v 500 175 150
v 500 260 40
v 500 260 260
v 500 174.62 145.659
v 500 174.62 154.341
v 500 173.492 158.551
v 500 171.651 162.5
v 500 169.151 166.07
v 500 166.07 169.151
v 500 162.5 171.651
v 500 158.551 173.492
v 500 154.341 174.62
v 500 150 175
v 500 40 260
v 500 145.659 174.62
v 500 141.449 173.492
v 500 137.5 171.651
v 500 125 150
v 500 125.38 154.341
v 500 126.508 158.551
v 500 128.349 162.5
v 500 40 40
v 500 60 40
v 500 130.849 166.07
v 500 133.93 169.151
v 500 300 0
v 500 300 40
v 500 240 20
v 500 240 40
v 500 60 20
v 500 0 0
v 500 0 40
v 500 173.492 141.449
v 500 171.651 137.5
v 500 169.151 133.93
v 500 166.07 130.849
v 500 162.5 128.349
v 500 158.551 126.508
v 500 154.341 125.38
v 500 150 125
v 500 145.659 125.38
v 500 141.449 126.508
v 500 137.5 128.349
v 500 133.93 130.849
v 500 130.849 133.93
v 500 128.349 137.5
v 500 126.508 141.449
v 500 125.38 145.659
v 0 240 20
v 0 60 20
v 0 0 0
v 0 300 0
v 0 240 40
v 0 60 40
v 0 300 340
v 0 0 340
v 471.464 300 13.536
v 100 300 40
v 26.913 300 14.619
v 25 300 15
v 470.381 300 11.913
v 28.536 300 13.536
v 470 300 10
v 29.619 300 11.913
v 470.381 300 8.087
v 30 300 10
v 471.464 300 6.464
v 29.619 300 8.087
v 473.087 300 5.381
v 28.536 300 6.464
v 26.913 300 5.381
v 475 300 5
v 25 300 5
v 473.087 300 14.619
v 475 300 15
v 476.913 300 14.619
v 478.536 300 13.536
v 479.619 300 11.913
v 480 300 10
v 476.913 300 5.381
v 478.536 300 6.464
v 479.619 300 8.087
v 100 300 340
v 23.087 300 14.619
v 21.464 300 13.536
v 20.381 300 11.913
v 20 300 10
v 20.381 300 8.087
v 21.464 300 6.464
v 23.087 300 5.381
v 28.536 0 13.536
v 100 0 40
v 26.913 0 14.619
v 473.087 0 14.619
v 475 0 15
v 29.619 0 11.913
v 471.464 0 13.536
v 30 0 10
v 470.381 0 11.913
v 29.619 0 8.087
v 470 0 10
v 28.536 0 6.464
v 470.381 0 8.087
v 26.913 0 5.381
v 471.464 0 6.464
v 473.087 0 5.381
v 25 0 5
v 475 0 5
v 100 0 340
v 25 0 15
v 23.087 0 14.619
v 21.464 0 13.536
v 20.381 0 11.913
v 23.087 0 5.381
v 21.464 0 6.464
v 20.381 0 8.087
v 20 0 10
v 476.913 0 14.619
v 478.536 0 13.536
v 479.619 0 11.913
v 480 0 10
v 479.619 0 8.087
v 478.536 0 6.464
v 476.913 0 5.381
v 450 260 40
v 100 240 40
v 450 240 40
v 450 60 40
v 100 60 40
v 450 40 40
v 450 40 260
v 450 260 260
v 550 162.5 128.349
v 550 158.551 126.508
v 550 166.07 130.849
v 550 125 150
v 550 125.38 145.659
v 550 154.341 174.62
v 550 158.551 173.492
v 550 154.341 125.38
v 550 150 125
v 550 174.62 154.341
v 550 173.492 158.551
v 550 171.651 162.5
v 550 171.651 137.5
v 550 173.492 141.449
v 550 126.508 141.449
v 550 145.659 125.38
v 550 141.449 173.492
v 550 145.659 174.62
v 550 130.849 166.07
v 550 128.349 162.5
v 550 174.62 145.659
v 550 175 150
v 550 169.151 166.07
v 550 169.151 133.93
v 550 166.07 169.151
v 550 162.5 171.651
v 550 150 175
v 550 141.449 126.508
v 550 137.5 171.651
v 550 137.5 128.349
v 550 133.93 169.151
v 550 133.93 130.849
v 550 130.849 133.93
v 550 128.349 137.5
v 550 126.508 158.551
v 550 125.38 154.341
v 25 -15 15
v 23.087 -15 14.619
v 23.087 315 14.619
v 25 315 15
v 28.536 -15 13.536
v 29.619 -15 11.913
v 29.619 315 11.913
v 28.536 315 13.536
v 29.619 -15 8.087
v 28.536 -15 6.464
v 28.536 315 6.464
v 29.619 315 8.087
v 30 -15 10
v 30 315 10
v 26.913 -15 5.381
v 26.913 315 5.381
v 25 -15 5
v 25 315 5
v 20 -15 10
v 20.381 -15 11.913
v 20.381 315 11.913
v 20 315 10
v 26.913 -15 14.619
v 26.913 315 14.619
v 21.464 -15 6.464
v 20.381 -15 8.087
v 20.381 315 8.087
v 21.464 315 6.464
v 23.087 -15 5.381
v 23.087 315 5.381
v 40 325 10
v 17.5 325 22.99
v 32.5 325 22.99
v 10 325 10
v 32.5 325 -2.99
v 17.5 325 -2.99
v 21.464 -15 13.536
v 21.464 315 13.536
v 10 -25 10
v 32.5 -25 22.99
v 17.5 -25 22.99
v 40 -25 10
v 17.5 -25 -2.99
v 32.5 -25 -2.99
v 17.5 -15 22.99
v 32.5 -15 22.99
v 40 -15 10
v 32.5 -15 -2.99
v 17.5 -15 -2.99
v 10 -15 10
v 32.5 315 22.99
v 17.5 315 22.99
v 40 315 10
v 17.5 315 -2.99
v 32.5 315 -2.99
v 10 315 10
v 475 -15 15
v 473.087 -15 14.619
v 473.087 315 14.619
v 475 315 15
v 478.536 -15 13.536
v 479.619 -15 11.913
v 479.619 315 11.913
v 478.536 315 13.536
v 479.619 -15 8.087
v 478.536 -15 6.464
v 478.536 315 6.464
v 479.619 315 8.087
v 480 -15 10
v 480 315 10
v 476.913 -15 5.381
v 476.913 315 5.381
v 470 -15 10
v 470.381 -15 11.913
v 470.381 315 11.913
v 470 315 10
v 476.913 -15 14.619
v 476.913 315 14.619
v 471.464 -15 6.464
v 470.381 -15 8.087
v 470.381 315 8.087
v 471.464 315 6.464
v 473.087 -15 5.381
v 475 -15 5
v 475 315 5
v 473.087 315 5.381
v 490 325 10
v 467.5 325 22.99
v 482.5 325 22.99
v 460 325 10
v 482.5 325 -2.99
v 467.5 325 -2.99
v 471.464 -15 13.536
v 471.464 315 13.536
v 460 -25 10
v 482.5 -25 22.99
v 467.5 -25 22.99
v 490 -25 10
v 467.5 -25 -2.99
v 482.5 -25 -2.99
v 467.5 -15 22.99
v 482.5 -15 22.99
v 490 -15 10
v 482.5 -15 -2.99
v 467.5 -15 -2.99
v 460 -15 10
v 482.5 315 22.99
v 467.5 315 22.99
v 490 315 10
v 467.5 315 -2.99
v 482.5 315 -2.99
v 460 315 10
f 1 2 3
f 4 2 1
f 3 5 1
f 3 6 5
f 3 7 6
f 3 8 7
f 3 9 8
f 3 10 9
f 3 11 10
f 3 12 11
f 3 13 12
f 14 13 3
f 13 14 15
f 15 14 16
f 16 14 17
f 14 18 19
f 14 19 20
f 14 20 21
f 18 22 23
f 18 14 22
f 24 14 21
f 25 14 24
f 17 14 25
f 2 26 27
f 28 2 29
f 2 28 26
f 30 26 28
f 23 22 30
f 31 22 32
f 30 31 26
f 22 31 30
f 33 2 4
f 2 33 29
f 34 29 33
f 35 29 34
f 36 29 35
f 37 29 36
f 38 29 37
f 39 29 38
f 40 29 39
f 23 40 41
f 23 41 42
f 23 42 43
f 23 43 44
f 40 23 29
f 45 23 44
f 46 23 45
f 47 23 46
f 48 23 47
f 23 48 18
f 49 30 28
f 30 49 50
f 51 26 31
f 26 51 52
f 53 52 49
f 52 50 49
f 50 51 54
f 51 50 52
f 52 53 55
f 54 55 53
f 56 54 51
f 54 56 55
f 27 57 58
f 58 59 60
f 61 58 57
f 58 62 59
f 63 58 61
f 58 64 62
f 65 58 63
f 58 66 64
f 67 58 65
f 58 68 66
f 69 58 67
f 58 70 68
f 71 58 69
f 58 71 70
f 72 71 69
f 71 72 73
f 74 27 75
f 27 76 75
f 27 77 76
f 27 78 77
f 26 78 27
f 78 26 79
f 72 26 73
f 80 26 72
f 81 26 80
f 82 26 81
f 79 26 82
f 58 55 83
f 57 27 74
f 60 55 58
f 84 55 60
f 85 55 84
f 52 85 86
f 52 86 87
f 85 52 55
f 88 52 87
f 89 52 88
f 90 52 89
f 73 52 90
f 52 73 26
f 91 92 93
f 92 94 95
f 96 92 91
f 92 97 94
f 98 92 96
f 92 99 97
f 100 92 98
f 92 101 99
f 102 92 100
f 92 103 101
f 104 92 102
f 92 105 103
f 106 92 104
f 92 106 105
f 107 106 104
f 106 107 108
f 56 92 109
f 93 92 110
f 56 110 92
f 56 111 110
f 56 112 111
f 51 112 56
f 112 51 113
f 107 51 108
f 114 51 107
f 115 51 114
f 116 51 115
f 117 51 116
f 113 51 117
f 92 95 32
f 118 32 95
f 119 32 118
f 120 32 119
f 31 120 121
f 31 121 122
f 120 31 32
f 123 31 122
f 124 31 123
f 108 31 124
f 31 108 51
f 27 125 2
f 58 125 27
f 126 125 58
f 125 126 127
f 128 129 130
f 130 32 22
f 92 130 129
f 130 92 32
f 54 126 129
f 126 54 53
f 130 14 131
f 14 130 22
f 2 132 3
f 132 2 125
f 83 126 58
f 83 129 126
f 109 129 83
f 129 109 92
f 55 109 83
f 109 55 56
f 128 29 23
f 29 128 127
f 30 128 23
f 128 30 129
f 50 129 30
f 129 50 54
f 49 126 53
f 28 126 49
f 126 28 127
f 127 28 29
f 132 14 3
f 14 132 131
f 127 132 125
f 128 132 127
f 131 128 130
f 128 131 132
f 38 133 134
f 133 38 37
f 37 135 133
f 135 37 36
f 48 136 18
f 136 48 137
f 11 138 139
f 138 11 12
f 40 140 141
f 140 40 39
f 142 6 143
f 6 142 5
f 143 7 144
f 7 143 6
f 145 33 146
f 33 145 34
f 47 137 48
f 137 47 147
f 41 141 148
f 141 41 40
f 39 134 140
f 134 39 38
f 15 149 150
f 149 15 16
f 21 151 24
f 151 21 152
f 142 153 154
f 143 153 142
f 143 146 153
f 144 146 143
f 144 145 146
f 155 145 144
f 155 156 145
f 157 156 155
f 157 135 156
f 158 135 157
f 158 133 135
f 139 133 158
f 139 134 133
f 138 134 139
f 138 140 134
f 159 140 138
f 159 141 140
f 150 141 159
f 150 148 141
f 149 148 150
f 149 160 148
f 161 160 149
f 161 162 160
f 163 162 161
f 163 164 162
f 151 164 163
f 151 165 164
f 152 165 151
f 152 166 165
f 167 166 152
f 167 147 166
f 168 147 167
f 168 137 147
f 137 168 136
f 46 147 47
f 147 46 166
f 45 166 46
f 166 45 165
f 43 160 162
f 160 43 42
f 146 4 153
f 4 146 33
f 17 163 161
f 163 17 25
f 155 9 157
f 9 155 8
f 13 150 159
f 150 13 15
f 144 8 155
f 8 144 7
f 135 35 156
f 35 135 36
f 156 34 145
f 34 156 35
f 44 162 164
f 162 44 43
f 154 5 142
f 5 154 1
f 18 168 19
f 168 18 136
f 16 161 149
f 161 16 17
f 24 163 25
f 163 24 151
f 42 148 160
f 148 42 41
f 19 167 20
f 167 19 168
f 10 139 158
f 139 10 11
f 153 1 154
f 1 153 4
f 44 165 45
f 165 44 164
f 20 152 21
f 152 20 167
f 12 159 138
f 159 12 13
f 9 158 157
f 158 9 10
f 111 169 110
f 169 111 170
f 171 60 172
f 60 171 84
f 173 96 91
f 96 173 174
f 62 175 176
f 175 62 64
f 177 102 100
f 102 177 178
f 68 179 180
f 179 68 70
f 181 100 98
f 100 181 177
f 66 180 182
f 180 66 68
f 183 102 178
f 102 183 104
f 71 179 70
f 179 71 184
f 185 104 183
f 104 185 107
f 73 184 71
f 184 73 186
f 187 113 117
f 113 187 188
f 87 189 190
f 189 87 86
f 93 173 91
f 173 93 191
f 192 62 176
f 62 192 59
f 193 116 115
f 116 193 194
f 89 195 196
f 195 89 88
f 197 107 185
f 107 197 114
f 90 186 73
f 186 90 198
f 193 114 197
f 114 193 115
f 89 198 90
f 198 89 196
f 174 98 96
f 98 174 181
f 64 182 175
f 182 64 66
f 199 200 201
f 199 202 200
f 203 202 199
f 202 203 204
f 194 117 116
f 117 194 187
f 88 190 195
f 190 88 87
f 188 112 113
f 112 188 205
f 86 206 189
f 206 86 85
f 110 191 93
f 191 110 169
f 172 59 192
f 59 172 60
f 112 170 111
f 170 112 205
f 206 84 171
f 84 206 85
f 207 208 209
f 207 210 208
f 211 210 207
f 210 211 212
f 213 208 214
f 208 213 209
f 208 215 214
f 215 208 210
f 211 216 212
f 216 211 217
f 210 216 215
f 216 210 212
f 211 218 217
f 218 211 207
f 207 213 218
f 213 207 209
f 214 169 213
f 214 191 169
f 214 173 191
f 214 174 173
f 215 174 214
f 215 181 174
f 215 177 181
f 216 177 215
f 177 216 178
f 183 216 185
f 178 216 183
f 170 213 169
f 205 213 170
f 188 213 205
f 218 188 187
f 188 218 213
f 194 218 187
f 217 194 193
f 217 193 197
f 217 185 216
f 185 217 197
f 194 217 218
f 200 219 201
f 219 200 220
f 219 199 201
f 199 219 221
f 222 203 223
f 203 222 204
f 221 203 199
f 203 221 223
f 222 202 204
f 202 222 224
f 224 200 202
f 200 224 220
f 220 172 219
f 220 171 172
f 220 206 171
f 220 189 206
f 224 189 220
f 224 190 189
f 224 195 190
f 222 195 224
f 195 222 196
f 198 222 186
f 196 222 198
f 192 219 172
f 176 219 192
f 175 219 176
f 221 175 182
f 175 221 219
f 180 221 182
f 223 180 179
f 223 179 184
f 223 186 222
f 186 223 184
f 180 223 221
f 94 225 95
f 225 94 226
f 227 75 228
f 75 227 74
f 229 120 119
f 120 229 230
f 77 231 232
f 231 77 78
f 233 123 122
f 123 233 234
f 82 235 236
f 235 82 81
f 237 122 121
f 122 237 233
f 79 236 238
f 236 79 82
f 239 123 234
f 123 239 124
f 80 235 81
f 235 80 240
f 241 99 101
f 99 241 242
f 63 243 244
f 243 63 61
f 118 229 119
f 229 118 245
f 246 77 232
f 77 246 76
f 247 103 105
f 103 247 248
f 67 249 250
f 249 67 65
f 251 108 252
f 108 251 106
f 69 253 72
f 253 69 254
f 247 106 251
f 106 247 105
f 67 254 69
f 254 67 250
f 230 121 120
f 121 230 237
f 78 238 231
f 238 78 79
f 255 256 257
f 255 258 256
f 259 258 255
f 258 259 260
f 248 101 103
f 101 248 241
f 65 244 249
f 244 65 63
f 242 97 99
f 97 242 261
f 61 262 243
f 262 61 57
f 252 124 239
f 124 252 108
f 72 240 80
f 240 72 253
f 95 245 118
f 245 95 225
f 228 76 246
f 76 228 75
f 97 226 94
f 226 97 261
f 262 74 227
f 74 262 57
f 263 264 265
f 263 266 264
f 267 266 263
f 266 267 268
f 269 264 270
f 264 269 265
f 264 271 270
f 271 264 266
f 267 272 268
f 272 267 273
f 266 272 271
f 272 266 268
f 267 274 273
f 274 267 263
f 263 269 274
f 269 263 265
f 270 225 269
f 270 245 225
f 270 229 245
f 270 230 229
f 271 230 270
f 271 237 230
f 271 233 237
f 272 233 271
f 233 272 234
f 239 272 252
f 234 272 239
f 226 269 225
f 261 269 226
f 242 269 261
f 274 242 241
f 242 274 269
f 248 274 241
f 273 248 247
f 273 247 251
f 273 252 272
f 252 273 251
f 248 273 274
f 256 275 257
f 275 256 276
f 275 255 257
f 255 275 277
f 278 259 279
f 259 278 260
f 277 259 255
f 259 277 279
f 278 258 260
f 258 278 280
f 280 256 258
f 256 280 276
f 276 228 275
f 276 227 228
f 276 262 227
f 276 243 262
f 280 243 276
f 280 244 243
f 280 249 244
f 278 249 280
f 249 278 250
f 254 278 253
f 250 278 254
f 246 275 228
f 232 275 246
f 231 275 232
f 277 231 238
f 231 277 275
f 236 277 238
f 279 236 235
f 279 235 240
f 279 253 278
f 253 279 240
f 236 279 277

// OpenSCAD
// camera concept
// animated, set FPS = 60 and Steps = 360

// base
union(){
    cube([500,300,20]);
    translate([0,20,20]) cube([500,20,20]);
    translate([0,260,20]) cube([500,20,20]);
}

// rear standard
translate([-$t*400,0,0]){
    union(){
        color("silver") translate([0,0,20]) cube([500,20,20]);
        color("silver") translate([0,280,20]) cube([500,20,20]);
        color("tan") translate([0,0,40]) cube([100,300,300]);
    }
}

// front standard
translate([$t*400,0,0]){
    union(){
        color("silver") translate([0,40,20]) cube([500,20,20]);
        color("silver") translate([0,240,20]) cube([500,20,20]);
        color("tan") translate([450,40,40]) cube([50,220,220]);
        color("black") translate([500,150,150]) rotate([0,90,0]) cylinder(r=25,h=50,$fn=36);
    }
}

// rear focus
union(){
    color("black") rotate([-90,0,0]) translate([25,-10,-25]) cylinder(r=5,h=350);
    color("black") rotate([-90,0,0]) translate([25,-10,-25]) rotate([0,0,-$t*360*8]) cylinder(r=15,h=10,$fn=6);
    color("black") rotate([-90,0,0]) translate([25,-10,315]) rotate([0,0,-$t*360*8]) cylinder(r=15,h=10,$fn=6);
}

// front focus
union(){
    color("black") rotate([-90,0,0]) translate([475,-10,-25]) cylinder(r=5,h=350);
    color("black") rotate([-90,0,0]) translate([475,-10,-25]) rotate([0,0,$t*360*8]) cylinder(r=15,h=10,$fn=6);
    color("black") rotate([-90,0,0]) translate([475,-10,315]) rotate([0,0,$t*360*8]) cylinder(r=15,h=10,$fn=6);
}
